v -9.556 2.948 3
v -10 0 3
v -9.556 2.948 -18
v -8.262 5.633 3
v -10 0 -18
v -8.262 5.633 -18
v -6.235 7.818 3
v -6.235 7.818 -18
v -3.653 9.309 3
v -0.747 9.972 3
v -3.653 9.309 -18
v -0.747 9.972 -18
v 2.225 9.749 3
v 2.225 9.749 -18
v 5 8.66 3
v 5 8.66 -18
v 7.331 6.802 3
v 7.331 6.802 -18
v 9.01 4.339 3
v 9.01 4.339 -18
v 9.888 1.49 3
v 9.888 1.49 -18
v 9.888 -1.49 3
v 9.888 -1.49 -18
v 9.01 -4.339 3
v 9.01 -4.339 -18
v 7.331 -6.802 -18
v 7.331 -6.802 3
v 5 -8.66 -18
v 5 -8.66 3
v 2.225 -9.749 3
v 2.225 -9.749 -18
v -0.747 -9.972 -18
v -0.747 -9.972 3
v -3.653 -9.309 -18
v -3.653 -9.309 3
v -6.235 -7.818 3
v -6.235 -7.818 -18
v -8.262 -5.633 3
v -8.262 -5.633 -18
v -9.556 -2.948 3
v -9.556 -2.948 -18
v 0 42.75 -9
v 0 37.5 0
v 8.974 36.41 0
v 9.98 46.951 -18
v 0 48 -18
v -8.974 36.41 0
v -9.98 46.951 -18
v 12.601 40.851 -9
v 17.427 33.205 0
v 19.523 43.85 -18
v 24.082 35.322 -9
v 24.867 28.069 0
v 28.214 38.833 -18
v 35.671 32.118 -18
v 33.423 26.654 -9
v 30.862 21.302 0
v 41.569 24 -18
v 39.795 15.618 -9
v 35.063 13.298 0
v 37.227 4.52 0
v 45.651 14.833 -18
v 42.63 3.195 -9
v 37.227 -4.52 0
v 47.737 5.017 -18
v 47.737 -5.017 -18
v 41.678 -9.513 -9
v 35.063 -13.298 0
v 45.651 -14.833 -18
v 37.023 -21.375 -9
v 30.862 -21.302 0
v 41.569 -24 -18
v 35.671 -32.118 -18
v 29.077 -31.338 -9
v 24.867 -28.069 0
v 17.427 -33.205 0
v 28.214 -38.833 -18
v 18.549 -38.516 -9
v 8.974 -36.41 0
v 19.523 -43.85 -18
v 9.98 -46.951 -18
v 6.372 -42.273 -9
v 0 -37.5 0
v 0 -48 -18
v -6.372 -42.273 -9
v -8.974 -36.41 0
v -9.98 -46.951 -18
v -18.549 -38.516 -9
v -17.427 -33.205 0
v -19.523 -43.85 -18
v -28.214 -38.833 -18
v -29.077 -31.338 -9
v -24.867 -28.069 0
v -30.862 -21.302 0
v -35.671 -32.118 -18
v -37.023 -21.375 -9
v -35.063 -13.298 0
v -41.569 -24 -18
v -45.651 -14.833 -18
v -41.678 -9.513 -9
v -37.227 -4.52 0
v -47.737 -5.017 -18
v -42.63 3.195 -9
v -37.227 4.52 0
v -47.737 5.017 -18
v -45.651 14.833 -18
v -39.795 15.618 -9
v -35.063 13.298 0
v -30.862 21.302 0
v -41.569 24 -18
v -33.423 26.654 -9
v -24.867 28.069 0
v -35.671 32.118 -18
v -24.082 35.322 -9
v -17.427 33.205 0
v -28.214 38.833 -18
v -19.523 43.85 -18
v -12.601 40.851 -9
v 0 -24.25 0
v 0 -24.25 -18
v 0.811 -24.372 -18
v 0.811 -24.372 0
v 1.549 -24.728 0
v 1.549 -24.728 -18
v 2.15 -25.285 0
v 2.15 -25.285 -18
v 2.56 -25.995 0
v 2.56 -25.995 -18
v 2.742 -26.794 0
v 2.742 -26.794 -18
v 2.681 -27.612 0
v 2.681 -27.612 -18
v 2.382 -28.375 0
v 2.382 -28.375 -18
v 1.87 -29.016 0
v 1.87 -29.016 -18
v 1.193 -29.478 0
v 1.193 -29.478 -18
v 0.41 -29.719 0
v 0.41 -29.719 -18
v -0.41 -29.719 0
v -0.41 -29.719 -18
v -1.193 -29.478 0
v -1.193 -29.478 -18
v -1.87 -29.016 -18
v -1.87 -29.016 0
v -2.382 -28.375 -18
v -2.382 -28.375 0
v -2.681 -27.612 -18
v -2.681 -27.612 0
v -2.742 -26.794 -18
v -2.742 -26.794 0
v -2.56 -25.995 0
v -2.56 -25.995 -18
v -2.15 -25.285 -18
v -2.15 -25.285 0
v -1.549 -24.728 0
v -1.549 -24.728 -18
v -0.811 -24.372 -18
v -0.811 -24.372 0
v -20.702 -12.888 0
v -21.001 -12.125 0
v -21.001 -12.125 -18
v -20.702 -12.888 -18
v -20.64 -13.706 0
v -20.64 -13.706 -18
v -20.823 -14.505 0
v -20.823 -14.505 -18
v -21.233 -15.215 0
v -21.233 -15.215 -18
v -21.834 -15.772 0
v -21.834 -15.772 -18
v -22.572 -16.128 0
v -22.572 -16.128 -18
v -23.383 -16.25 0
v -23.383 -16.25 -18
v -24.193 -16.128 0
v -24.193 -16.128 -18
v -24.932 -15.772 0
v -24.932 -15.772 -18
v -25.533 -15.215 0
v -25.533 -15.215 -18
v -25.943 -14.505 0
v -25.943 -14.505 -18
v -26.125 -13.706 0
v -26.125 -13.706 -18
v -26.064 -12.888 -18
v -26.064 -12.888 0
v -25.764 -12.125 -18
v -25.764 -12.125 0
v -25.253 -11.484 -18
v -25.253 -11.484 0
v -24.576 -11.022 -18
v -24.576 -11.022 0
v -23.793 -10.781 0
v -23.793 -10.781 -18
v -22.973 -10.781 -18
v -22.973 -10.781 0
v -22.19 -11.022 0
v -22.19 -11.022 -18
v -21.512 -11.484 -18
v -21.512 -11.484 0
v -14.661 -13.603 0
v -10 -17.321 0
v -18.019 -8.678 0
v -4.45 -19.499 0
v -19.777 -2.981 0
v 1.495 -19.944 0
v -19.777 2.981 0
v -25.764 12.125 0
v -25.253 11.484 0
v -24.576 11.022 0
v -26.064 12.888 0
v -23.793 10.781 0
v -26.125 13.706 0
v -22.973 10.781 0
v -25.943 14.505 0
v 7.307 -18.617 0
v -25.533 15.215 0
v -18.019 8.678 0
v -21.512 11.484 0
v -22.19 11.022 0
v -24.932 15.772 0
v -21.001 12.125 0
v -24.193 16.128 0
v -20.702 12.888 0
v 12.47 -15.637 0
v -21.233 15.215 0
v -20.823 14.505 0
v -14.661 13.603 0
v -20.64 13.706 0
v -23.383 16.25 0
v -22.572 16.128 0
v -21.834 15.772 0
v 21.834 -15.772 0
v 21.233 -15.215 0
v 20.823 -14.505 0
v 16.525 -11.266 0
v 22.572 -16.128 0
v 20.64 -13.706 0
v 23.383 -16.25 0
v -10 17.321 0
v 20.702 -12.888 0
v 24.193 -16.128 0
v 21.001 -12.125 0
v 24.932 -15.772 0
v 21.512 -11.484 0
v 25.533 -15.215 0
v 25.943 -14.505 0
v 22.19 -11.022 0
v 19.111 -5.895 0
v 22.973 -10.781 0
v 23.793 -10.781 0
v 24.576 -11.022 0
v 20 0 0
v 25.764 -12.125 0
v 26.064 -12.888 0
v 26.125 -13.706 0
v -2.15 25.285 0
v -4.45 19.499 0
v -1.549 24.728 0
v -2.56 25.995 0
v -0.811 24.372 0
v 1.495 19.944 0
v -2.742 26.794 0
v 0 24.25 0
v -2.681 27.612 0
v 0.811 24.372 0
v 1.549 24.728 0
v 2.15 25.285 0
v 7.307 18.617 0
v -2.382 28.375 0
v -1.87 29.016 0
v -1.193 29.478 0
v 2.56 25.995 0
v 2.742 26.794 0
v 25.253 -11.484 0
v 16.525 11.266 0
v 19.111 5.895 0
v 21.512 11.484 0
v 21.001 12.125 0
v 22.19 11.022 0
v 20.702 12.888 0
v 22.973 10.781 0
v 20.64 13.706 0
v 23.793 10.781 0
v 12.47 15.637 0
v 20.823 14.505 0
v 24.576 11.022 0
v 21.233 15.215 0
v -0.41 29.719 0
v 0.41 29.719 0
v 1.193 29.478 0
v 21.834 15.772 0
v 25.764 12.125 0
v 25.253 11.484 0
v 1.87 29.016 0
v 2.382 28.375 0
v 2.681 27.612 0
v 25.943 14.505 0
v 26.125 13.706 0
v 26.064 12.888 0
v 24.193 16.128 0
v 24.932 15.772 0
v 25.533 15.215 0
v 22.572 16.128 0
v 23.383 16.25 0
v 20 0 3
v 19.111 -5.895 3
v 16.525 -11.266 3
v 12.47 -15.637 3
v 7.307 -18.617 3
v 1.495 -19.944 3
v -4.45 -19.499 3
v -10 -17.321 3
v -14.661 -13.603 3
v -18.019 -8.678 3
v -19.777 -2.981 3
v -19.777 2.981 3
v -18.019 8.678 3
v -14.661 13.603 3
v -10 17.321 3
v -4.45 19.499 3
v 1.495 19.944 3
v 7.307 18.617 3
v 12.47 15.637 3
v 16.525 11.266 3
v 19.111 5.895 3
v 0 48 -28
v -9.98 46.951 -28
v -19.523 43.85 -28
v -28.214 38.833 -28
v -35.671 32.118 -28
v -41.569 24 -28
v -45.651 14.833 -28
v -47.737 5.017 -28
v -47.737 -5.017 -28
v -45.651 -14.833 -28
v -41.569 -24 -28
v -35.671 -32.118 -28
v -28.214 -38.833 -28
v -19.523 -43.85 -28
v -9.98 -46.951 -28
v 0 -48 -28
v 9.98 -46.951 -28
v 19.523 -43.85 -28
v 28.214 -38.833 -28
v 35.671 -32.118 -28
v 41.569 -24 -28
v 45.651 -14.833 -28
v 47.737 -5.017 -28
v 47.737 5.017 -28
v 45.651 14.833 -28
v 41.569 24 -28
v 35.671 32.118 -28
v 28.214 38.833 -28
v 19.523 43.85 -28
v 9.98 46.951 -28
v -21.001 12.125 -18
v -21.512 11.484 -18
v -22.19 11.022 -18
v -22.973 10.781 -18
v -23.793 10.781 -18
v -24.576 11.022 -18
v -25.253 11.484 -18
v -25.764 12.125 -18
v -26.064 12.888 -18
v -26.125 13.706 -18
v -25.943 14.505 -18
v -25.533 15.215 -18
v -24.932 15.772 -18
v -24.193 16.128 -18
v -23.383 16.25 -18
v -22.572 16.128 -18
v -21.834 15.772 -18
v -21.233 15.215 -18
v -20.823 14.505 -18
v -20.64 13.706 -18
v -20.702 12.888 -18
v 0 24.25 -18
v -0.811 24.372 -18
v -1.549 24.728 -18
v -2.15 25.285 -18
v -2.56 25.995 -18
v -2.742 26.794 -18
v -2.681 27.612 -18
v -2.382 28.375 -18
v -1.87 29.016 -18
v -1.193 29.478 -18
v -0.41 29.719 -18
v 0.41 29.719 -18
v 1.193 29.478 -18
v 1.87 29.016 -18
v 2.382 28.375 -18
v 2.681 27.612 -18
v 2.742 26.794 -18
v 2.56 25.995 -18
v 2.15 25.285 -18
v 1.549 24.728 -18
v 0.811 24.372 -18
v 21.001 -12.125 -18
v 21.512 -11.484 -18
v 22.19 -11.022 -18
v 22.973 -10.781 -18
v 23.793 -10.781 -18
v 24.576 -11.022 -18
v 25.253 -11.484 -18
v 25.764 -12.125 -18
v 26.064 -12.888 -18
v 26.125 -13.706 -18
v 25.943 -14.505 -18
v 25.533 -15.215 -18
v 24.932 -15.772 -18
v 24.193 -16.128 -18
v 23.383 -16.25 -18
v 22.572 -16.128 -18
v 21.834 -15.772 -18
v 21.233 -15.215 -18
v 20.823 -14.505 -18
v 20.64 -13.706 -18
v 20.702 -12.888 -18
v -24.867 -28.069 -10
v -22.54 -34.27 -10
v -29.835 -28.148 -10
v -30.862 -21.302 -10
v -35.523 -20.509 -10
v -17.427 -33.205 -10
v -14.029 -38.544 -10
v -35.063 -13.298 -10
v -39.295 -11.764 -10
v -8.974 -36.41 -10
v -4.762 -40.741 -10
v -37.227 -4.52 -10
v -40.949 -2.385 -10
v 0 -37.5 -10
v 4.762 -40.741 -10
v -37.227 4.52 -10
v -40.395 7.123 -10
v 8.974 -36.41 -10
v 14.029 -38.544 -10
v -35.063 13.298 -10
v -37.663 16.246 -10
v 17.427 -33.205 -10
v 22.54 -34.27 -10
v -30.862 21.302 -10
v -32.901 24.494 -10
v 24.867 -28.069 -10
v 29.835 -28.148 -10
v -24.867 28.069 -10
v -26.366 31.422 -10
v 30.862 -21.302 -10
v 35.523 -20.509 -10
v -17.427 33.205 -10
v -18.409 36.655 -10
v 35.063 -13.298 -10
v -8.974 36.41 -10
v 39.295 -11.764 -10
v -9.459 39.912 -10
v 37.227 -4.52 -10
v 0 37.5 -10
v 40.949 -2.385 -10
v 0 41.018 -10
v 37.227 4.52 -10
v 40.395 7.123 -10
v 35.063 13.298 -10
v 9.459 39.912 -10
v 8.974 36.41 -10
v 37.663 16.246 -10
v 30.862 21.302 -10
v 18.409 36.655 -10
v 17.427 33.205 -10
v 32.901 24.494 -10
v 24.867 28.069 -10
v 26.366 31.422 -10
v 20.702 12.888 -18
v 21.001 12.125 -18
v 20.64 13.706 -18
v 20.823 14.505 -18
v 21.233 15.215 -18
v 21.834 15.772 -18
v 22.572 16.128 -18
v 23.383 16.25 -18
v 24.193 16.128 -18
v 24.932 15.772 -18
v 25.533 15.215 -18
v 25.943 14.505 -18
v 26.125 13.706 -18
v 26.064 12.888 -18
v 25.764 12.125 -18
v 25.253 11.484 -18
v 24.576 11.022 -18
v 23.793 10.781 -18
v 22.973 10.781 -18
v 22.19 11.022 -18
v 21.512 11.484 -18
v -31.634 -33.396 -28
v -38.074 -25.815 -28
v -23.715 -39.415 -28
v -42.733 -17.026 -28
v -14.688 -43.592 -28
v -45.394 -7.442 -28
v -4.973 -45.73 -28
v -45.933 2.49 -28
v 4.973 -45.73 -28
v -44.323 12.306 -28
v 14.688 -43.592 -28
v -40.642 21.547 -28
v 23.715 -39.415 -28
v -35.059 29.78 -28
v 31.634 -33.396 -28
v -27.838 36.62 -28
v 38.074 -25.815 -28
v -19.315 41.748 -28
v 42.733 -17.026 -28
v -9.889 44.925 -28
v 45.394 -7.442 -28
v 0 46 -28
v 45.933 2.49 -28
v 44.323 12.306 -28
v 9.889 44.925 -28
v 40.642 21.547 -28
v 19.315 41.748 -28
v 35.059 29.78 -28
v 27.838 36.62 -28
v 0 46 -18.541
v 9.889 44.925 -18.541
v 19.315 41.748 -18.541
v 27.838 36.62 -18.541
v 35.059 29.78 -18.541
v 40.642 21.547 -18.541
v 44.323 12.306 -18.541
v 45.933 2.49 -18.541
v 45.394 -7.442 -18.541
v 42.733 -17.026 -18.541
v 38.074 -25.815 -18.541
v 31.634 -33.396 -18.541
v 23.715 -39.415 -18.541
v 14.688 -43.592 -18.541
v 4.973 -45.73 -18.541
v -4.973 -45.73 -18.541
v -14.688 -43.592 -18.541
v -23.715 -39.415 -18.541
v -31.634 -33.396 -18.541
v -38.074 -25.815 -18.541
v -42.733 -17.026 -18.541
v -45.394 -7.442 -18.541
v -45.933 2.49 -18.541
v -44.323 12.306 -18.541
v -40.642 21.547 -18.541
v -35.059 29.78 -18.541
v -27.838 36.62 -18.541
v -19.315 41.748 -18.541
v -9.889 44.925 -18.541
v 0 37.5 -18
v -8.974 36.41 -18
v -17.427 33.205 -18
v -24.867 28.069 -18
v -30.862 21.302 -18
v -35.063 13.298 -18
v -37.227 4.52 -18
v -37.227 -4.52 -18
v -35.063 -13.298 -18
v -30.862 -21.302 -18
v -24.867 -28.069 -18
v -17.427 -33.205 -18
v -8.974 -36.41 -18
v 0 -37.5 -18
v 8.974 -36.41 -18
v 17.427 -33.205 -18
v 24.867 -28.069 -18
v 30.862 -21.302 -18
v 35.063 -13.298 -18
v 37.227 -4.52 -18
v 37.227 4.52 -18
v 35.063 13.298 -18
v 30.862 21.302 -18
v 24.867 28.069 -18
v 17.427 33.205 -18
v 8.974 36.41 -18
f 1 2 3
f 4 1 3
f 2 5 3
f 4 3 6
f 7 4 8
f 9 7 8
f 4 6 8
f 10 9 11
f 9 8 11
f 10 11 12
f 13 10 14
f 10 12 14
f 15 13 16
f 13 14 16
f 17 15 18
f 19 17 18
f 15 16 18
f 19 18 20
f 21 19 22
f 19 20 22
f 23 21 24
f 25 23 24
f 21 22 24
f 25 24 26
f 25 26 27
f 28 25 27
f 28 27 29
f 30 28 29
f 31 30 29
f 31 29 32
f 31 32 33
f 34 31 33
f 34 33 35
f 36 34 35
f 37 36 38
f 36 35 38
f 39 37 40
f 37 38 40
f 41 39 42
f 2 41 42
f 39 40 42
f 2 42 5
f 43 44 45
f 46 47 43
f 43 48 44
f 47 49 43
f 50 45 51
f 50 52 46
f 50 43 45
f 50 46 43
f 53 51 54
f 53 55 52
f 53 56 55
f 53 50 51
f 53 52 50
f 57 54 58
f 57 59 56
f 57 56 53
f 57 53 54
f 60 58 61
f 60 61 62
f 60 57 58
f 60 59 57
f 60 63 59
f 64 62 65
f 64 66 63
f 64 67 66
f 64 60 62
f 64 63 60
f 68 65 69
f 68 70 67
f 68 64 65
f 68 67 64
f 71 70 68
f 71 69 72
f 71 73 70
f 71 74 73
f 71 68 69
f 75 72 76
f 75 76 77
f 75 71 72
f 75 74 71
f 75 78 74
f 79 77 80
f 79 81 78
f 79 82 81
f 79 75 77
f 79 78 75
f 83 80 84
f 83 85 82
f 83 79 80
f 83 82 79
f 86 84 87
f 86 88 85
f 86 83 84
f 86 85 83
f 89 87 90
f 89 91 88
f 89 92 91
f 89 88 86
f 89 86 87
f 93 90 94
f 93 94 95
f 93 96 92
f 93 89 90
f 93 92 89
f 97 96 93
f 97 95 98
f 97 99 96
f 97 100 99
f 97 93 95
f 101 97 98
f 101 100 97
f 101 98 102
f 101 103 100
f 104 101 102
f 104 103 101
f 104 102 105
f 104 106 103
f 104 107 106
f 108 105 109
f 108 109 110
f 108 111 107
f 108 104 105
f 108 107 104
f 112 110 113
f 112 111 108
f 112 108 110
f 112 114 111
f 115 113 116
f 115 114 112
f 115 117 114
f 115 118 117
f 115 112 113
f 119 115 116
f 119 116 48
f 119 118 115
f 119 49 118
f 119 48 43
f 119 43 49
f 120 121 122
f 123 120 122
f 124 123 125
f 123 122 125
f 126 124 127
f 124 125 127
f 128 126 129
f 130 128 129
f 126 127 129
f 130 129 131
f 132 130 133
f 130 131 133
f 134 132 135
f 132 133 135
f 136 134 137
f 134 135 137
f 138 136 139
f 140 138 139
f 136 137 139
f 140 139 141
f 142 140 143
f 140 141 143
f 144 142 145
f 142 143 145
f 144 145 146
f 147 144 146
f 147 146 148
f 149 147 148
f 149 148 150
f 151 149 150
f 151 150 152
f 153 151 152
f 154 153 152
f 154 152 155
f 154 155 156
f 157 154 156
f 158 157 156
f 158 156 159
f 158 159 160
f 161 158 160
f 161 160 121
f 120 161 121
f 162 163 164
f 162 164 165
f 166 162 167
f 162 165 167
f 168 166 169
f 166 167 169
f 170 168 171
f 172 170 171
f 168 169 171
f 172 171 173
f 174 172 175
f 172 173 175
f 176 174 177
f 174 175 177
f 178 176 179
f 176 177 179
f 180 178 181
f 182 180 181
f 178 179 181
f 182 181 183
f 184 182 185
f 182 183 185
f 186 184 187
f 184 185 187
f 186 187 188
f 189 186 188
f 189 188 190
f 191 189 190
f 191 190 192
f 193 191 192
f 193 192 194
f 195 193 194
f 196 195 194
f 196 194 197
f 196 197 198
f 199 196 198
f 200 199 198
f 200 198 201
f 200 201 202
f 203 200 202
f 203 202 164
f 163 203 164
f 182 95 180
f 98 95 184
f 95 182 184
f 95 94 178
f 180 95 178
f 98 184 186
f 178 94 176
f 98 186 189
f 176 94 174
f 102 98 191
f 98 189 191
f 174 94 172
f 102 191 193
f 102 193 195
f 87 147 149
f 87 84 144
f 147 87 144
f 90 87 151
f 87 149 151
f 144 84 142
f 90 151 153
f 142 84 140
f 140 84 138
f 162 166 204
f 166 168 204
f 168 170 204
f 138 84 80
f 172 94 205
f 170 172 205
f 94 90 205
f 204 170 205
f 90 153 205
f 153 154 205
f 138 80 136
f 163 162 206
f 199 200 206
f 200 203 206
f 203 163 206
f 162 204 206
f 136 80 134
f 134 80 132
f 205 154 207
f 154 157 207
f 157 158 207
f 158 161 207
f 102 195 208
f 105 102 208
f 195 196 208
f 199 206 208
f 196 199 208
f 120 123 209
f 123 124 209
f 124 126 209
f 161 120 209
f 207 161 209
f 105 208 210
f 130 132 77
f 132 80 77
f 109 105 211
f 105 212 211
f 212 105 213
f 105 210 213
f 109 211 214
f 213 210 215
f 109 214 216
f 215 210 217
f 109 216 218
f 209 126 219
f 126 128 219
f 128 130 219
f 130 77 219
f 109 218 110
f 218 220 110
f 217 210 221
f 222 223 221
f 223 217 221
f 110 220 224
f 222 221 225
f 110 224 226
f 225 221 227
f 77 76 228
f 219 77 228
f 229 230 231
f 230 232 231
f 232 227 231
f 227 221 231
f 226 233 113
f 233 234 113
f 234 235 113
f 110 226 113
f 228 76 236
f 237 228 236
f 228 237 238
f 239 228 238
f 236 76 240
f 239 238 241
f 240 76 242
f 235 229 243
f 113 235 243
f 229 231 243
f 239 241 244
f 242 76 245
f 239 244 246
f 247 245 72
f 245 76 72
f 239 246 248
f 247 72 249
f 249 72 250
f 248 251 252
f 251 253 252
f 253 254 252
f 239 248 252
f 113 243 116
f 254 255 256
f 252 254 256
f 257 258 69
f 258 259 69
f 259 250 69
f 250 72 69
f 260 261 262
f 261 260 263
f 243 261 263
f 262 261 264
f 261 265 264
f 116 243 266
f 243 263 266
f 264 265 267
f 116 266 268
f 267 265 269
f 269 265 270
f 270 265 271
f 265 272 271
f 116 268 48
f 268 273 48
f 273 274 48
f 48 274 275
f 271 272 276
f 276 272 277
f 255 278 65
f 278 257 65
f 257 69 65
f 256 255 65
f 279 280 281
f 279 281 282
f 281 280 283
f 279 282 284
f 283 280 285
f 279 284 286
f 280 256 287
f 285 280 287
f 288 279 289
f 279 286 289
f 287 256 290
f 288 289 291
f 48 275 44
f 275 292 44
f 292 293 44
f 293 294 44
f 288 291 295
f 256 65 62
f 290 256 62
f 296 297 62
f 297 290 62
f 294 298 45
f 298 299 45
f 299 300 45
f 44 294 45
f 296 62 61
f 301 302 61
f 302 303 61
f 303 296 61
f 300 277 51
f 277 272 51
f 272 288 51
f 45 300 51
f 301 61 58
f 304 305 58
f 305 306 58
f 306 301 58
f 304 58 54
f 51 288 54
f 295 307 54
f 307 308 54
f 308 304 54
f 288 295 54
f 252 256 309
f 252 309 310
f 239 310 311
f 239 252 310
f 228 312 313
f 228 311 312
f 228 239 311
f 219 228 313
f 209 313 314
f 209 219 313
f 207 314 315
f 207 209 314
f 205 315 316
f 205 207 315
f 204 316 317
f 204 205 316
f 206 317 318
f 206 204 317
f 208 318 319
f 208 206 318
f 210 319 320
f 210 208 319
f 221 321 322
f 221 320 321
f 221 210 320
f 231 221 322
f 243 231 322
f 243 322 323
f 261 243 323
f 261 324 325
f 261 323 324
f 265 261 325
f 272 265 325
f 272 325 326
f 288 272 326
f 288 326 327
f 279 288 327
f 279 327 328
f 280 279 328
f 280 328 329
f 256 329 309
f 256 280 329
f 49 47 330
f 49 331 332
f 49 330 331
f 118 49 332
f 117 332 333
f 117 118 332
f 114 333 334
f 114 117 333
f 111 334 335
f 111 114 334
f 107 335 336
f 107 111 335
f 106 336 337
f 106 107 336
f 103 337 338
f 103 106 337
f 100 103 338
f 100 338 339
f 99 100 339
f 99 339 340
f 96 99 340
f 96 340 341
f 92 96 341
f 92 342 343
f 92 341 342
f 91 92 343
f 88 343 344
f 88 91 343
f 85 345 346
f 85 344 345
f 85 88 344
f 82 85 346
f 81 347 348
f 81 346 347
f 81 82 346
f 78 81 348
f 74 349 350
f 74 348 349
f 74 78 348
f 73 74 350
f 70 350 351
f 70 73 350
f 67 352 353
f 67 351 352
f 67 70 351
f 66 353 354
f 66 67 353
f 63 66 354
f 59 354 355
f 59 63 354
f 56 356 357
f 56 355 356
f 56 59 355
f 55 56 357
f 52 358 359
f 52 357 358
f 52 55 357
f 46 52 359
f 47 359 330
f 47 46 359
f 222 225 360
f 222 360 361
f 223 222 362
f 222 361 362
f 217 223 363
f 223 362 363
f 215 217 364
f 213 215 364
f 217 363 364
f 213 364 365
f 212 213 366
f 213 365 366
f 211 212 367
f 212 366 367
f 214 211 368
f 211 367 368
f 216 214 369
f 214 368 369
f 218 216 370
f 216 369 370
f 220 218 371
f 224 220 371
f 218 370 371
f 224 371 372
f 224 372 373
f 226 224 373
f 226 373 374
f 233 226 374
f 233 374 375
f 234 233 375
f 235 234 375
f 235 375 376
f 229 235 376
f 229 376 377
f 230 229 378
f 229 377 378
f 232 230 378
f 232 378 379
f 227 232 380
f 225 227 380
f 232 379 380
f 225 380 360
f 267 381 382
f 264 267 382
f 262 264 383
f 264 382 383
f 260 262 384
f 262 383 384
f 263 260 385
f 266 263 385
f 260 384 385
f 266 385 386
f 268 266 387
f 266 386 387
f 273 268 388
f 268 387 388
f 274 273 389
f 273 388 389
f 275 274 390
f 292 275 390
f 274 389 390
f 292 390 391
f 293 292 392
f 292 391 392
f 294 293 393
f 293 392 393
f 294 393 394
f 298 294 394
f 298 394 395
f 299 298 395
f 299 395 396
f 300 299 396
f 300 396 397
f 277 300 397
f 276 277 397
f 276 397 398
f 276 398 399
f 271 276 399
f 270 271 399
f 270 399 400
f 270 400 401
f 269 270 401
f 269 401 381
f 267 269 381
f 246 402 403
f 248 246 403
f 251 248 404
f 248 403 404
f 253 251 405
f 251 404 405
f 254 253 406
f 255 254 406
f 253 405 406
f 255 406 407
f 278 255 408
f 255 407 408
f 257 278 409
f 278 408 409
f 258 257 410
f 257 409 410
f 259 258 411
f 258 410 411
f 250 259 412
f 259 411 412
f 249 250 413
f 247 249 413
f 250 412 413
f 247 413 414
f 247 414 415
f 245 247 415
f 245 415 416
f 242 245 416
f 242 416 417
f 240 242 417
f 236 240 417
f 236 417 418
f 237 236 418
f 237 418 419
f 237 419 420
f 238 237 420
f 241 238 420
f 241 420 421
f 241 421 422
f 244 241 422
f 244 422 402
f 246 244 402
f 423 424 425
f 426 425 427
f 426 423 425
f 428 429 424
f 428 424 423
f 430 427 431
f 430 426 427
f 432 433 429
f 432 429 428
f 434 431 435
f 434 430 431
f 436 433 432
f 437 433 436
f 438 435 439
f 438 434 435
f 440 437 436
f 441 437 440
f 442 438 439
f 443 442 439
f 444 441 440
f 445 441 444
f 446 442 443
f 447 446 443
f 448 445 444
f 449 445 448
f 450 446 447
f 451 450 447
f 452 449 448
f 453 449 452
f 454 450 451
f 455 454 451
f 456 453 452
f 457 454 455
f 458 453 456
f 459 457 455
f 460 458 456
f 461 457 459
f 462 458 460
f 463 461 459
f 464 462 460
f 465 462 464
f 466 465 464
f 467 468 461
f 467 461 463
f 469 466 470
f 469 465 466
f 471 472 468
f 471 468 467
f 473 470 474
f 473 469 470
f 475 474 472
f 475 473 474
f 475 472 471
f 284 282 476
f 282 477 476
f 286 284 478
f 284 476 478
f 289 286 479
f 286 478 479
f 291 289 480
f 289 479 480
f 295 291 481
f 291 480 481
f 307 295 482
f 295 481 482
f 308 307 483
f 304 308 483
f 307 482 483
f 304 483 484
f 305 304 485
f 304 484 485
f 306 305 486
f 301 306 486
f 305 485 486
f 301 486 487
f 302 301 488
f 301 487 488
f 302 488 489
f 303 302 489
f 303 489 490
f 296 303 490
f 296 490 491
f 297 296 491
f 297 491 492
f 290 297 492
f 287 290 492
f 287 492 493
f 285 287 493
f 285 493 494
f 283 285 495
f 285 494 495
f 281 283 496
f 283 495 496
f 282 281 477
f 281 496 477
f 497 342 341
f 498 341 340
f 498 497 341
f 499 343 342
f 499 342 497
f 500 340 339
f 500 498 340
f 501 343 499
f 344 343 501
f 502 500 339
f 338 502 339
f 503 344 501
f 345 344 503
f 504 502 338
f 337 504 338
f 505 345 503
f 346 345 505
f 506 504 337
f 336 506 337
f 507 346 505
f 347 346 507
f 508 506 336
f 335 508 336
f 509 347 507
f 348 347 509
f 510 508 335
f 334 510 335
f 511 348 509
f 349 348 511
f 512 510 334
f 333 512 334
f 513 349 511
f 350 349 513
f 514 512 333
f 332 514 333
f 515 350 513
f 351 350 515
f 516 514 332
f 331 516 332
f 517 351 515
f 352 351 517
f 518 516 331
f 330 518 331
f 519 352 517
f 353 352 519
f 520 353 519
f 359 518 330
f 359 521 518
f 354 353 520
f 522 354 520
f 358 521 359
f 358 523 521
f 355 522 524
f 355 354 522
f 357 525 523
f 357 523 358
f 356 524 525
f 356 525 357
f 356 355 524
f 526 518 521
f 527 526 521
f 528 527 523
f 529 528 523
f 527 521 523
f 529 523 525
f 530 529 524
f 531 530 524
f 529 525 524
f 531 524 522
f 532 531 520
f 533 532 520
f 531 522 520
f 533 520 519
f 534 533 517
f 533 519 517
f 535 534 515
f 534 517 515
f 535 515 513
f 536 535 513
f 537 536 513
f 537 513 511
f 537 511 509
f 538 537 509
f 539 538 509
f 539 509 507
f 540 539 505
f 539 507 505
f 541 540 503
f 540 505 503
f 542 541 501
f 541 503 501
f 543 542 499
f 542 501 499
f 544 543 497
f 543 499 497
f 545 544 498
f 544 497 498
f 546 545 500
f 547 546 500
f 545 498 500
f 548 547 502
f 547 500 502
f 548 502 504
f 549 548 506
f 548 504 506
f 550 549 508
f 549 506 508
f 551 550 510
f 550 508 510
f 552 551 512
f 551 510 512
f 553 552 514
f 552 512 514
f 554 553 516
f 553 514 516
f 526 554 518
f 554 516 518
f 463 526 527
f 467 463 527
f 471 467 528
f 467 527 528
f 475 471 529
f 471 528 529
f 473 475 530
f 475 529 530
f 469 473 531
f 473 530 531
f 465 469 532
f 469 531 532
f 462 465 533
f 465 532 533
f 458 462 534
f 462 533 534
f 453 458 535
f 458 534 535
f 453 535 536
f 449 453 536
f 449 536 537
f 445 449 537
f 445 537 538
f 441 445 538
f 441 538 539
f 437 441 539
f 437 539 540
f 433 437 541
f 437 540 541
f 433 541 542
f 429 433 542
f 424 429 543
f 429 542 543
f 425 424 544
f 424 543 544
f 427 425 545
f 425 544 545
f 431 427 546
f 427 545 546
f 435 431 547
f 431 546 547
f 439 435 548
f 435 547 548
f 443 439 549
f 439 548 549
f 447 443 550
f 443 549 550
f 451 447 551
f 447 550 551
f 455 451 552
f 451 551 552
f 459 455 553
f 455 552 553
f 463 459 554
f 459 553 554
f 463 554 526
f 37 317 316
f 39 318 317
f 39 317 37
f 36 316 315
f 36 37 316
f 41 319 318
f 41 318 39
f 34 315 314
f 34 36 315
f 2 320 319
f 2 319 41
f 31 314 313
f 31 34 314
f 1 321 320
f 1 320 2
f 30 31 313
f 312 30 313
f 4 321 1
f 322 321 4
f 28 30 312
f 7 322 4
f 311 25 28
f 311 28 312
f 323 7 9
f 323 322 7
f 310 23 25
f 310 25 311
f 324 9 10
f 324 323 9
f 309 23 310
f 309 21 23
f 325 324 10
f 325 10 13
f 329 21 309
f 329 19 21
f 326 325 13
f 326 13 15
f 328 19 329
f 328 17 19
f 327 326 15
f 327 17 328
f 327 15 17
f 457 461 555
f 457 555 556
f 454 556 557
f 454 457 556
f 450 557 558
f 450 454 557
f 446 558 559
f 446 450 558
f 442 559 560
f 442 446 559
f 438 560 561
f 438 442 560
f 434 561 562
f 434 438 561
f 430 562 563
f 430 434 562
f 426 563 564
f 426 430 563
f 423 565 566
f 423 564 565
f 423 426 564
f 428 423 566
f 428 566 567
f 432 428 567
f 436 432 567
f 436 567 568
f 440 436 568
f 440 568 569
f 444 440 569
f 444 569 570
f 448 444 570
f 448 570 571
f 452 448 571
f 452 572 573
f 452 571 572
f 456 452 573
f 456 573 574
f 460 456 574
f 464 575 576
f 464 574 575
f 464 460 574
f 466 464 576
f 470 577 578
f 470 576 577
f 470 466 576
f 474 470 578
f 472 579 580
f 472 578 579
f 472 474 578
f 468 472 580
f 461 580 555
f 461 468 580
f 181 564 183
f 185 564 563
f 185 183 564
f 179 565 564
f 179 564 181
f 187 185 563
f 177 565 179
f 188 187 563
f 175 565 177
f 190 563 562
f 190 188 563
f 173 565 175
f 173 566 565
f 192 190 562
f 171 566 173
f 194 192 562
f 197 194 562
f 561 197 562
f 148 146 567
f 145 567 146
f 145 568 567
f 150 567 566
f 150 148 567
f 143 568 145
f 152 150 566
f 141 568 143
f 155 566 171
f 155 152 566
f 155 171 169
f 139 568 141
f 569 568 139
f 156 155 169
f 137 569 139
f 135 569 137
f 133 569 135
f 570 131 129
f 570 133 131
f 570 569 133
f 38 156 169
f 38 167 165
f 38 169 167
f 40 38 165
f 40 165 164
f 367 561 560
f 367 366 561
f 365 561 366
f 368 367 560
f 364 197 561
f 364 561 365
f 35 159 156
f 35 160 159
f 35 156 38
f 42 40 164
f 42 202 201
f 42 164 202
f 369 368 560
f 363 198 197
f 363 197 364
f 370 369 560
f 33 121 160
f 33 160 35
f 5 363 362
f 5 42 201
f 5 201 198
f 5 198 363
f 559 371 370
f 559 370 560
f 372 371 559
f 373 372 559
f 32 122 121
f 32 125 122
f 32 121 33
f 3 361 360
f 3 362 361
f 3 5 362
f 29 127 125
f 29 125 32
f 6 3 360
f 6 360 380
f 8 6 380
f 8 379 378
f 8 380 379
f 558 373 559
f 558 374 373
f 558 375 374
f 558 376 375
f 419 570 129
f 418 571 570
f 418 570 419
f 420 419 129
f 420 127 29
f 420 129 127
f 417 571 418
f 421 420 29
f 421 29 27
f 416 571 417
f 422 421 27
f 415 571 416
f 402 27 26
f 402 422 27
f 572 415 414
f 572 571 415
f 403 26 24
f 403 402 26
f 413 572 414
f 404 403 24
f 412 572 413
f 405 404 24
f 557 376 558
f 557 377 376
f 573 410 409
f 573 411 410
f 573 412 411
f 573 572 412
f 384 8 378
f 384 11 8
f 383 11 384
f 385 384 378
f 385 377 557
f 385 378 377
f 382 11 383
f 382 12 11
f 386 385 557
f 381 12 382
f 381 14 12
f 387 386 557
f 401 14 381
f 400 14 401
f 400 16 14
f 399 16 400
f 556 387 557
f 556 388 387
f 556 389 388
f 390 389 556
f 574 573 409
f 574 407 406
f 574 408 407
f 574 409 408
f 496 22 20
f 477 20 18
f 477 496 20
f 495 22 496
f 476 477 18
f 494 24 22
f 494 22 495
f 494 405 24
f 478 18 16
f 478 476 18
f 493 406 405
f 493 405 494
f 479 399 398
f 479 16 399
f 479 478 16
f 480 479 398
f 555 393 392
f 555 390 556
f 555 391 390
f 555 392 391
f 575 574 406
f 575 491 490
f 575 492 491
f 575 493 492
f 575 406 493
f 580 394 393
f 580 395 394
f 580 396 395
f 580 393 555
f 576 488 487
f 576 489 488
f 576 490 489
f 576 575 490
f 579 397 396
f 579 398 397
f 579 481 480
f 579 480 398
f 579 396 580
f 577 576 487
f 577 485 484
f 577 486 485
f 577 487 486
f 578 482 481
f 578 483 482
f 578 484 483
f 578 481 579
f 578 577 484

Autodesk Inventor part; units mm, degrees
ref_plane "YZ Plane" through (0, 0, 0) normal (1, 0, 0) x (0, 1, 0)
ref_plane "XZ Plane" through (0, 0, 0) normal (0, 1, 0) x (-1, 0, 0)
ref_plane "XY Plane" through (0, 0, 0) normal (0, 0, 1) x (1, 0, 0)
sketch "Sketch1" plane through (0, 0, 0) normal (1, 0, 0) x (0, 1, 0)
  line L0 (0, 0) -> (0, -18)
  line L1 (37.5, 0) -> (48, -18)
  line L2 (37.5, 0) -> (0, 0)
  line L3 (46, -18.5407) -> (41.0179, -10)
  line L4 (41.0179, -10) -> (37.5, -10)
  line L5 (46, -18.5407) -> (46, -28)
  line L6 (46, -28) -> (48, -28)
  line L7 (48, -28) -> (48, -18)
  line L8 (0, -18) -> (37.5, -18)
  line L9 (37.5, -18) -> (37.5, -10)
  dimension "d0" = 18
  dimension "d6" = 75
  dimension "d7" = 96
  dimension "d9" = 10
  dimension "d10" = 10
  dimension "d11" = 2
  dimension "d12" = 2
revolve "Revolution1" add sketch "Sketch1" angle 360 about axis through (0, 0, 0) along (0, 0, -1)
sketch "Sketch2" plane through (0, 0, 0) normal (0, 0, 1) x (1, 0, 0)
  circle A0 centre (0, 0) radius 20
  point P0 (0, 0)
  dimension "d14" = 40
extrude "Extrusion1" add sketch "Sketch2" along normal blind 3
sketch "Sketch3" plane through (0, 0, -18) normal (0, 0, -1) x (-1, 0, 0)
  circle A0 centre (0, 0) radius 10
  point P0 (0, 0)
  dimension "d17" = 20
extrude "Extrusion2" cut sketch "Sketch3" against normal through all
sketch "Sketch4" plane through (0, 0, 0) normal (0, 0, 1) x (1, 0, 0)
  circle A0 centre (0, 27) radius 2.065
  point P0 (0, 0)
  dimension "d20" = 27
hole "Hole1" at (0, 27, 0) direction (0, 0, -1) diameter 5.5 end through all
thread "Thread2" size "M5.5x0.5" class "6H" standard "ANSI Metric M Profile" full length
pattern_circular "Circular Pattern1" count 6 over 360 about axis through (0, 0, -9) along (0, 0, -1) of "Hole1"
properties part number "301-08" material "Titanium"
